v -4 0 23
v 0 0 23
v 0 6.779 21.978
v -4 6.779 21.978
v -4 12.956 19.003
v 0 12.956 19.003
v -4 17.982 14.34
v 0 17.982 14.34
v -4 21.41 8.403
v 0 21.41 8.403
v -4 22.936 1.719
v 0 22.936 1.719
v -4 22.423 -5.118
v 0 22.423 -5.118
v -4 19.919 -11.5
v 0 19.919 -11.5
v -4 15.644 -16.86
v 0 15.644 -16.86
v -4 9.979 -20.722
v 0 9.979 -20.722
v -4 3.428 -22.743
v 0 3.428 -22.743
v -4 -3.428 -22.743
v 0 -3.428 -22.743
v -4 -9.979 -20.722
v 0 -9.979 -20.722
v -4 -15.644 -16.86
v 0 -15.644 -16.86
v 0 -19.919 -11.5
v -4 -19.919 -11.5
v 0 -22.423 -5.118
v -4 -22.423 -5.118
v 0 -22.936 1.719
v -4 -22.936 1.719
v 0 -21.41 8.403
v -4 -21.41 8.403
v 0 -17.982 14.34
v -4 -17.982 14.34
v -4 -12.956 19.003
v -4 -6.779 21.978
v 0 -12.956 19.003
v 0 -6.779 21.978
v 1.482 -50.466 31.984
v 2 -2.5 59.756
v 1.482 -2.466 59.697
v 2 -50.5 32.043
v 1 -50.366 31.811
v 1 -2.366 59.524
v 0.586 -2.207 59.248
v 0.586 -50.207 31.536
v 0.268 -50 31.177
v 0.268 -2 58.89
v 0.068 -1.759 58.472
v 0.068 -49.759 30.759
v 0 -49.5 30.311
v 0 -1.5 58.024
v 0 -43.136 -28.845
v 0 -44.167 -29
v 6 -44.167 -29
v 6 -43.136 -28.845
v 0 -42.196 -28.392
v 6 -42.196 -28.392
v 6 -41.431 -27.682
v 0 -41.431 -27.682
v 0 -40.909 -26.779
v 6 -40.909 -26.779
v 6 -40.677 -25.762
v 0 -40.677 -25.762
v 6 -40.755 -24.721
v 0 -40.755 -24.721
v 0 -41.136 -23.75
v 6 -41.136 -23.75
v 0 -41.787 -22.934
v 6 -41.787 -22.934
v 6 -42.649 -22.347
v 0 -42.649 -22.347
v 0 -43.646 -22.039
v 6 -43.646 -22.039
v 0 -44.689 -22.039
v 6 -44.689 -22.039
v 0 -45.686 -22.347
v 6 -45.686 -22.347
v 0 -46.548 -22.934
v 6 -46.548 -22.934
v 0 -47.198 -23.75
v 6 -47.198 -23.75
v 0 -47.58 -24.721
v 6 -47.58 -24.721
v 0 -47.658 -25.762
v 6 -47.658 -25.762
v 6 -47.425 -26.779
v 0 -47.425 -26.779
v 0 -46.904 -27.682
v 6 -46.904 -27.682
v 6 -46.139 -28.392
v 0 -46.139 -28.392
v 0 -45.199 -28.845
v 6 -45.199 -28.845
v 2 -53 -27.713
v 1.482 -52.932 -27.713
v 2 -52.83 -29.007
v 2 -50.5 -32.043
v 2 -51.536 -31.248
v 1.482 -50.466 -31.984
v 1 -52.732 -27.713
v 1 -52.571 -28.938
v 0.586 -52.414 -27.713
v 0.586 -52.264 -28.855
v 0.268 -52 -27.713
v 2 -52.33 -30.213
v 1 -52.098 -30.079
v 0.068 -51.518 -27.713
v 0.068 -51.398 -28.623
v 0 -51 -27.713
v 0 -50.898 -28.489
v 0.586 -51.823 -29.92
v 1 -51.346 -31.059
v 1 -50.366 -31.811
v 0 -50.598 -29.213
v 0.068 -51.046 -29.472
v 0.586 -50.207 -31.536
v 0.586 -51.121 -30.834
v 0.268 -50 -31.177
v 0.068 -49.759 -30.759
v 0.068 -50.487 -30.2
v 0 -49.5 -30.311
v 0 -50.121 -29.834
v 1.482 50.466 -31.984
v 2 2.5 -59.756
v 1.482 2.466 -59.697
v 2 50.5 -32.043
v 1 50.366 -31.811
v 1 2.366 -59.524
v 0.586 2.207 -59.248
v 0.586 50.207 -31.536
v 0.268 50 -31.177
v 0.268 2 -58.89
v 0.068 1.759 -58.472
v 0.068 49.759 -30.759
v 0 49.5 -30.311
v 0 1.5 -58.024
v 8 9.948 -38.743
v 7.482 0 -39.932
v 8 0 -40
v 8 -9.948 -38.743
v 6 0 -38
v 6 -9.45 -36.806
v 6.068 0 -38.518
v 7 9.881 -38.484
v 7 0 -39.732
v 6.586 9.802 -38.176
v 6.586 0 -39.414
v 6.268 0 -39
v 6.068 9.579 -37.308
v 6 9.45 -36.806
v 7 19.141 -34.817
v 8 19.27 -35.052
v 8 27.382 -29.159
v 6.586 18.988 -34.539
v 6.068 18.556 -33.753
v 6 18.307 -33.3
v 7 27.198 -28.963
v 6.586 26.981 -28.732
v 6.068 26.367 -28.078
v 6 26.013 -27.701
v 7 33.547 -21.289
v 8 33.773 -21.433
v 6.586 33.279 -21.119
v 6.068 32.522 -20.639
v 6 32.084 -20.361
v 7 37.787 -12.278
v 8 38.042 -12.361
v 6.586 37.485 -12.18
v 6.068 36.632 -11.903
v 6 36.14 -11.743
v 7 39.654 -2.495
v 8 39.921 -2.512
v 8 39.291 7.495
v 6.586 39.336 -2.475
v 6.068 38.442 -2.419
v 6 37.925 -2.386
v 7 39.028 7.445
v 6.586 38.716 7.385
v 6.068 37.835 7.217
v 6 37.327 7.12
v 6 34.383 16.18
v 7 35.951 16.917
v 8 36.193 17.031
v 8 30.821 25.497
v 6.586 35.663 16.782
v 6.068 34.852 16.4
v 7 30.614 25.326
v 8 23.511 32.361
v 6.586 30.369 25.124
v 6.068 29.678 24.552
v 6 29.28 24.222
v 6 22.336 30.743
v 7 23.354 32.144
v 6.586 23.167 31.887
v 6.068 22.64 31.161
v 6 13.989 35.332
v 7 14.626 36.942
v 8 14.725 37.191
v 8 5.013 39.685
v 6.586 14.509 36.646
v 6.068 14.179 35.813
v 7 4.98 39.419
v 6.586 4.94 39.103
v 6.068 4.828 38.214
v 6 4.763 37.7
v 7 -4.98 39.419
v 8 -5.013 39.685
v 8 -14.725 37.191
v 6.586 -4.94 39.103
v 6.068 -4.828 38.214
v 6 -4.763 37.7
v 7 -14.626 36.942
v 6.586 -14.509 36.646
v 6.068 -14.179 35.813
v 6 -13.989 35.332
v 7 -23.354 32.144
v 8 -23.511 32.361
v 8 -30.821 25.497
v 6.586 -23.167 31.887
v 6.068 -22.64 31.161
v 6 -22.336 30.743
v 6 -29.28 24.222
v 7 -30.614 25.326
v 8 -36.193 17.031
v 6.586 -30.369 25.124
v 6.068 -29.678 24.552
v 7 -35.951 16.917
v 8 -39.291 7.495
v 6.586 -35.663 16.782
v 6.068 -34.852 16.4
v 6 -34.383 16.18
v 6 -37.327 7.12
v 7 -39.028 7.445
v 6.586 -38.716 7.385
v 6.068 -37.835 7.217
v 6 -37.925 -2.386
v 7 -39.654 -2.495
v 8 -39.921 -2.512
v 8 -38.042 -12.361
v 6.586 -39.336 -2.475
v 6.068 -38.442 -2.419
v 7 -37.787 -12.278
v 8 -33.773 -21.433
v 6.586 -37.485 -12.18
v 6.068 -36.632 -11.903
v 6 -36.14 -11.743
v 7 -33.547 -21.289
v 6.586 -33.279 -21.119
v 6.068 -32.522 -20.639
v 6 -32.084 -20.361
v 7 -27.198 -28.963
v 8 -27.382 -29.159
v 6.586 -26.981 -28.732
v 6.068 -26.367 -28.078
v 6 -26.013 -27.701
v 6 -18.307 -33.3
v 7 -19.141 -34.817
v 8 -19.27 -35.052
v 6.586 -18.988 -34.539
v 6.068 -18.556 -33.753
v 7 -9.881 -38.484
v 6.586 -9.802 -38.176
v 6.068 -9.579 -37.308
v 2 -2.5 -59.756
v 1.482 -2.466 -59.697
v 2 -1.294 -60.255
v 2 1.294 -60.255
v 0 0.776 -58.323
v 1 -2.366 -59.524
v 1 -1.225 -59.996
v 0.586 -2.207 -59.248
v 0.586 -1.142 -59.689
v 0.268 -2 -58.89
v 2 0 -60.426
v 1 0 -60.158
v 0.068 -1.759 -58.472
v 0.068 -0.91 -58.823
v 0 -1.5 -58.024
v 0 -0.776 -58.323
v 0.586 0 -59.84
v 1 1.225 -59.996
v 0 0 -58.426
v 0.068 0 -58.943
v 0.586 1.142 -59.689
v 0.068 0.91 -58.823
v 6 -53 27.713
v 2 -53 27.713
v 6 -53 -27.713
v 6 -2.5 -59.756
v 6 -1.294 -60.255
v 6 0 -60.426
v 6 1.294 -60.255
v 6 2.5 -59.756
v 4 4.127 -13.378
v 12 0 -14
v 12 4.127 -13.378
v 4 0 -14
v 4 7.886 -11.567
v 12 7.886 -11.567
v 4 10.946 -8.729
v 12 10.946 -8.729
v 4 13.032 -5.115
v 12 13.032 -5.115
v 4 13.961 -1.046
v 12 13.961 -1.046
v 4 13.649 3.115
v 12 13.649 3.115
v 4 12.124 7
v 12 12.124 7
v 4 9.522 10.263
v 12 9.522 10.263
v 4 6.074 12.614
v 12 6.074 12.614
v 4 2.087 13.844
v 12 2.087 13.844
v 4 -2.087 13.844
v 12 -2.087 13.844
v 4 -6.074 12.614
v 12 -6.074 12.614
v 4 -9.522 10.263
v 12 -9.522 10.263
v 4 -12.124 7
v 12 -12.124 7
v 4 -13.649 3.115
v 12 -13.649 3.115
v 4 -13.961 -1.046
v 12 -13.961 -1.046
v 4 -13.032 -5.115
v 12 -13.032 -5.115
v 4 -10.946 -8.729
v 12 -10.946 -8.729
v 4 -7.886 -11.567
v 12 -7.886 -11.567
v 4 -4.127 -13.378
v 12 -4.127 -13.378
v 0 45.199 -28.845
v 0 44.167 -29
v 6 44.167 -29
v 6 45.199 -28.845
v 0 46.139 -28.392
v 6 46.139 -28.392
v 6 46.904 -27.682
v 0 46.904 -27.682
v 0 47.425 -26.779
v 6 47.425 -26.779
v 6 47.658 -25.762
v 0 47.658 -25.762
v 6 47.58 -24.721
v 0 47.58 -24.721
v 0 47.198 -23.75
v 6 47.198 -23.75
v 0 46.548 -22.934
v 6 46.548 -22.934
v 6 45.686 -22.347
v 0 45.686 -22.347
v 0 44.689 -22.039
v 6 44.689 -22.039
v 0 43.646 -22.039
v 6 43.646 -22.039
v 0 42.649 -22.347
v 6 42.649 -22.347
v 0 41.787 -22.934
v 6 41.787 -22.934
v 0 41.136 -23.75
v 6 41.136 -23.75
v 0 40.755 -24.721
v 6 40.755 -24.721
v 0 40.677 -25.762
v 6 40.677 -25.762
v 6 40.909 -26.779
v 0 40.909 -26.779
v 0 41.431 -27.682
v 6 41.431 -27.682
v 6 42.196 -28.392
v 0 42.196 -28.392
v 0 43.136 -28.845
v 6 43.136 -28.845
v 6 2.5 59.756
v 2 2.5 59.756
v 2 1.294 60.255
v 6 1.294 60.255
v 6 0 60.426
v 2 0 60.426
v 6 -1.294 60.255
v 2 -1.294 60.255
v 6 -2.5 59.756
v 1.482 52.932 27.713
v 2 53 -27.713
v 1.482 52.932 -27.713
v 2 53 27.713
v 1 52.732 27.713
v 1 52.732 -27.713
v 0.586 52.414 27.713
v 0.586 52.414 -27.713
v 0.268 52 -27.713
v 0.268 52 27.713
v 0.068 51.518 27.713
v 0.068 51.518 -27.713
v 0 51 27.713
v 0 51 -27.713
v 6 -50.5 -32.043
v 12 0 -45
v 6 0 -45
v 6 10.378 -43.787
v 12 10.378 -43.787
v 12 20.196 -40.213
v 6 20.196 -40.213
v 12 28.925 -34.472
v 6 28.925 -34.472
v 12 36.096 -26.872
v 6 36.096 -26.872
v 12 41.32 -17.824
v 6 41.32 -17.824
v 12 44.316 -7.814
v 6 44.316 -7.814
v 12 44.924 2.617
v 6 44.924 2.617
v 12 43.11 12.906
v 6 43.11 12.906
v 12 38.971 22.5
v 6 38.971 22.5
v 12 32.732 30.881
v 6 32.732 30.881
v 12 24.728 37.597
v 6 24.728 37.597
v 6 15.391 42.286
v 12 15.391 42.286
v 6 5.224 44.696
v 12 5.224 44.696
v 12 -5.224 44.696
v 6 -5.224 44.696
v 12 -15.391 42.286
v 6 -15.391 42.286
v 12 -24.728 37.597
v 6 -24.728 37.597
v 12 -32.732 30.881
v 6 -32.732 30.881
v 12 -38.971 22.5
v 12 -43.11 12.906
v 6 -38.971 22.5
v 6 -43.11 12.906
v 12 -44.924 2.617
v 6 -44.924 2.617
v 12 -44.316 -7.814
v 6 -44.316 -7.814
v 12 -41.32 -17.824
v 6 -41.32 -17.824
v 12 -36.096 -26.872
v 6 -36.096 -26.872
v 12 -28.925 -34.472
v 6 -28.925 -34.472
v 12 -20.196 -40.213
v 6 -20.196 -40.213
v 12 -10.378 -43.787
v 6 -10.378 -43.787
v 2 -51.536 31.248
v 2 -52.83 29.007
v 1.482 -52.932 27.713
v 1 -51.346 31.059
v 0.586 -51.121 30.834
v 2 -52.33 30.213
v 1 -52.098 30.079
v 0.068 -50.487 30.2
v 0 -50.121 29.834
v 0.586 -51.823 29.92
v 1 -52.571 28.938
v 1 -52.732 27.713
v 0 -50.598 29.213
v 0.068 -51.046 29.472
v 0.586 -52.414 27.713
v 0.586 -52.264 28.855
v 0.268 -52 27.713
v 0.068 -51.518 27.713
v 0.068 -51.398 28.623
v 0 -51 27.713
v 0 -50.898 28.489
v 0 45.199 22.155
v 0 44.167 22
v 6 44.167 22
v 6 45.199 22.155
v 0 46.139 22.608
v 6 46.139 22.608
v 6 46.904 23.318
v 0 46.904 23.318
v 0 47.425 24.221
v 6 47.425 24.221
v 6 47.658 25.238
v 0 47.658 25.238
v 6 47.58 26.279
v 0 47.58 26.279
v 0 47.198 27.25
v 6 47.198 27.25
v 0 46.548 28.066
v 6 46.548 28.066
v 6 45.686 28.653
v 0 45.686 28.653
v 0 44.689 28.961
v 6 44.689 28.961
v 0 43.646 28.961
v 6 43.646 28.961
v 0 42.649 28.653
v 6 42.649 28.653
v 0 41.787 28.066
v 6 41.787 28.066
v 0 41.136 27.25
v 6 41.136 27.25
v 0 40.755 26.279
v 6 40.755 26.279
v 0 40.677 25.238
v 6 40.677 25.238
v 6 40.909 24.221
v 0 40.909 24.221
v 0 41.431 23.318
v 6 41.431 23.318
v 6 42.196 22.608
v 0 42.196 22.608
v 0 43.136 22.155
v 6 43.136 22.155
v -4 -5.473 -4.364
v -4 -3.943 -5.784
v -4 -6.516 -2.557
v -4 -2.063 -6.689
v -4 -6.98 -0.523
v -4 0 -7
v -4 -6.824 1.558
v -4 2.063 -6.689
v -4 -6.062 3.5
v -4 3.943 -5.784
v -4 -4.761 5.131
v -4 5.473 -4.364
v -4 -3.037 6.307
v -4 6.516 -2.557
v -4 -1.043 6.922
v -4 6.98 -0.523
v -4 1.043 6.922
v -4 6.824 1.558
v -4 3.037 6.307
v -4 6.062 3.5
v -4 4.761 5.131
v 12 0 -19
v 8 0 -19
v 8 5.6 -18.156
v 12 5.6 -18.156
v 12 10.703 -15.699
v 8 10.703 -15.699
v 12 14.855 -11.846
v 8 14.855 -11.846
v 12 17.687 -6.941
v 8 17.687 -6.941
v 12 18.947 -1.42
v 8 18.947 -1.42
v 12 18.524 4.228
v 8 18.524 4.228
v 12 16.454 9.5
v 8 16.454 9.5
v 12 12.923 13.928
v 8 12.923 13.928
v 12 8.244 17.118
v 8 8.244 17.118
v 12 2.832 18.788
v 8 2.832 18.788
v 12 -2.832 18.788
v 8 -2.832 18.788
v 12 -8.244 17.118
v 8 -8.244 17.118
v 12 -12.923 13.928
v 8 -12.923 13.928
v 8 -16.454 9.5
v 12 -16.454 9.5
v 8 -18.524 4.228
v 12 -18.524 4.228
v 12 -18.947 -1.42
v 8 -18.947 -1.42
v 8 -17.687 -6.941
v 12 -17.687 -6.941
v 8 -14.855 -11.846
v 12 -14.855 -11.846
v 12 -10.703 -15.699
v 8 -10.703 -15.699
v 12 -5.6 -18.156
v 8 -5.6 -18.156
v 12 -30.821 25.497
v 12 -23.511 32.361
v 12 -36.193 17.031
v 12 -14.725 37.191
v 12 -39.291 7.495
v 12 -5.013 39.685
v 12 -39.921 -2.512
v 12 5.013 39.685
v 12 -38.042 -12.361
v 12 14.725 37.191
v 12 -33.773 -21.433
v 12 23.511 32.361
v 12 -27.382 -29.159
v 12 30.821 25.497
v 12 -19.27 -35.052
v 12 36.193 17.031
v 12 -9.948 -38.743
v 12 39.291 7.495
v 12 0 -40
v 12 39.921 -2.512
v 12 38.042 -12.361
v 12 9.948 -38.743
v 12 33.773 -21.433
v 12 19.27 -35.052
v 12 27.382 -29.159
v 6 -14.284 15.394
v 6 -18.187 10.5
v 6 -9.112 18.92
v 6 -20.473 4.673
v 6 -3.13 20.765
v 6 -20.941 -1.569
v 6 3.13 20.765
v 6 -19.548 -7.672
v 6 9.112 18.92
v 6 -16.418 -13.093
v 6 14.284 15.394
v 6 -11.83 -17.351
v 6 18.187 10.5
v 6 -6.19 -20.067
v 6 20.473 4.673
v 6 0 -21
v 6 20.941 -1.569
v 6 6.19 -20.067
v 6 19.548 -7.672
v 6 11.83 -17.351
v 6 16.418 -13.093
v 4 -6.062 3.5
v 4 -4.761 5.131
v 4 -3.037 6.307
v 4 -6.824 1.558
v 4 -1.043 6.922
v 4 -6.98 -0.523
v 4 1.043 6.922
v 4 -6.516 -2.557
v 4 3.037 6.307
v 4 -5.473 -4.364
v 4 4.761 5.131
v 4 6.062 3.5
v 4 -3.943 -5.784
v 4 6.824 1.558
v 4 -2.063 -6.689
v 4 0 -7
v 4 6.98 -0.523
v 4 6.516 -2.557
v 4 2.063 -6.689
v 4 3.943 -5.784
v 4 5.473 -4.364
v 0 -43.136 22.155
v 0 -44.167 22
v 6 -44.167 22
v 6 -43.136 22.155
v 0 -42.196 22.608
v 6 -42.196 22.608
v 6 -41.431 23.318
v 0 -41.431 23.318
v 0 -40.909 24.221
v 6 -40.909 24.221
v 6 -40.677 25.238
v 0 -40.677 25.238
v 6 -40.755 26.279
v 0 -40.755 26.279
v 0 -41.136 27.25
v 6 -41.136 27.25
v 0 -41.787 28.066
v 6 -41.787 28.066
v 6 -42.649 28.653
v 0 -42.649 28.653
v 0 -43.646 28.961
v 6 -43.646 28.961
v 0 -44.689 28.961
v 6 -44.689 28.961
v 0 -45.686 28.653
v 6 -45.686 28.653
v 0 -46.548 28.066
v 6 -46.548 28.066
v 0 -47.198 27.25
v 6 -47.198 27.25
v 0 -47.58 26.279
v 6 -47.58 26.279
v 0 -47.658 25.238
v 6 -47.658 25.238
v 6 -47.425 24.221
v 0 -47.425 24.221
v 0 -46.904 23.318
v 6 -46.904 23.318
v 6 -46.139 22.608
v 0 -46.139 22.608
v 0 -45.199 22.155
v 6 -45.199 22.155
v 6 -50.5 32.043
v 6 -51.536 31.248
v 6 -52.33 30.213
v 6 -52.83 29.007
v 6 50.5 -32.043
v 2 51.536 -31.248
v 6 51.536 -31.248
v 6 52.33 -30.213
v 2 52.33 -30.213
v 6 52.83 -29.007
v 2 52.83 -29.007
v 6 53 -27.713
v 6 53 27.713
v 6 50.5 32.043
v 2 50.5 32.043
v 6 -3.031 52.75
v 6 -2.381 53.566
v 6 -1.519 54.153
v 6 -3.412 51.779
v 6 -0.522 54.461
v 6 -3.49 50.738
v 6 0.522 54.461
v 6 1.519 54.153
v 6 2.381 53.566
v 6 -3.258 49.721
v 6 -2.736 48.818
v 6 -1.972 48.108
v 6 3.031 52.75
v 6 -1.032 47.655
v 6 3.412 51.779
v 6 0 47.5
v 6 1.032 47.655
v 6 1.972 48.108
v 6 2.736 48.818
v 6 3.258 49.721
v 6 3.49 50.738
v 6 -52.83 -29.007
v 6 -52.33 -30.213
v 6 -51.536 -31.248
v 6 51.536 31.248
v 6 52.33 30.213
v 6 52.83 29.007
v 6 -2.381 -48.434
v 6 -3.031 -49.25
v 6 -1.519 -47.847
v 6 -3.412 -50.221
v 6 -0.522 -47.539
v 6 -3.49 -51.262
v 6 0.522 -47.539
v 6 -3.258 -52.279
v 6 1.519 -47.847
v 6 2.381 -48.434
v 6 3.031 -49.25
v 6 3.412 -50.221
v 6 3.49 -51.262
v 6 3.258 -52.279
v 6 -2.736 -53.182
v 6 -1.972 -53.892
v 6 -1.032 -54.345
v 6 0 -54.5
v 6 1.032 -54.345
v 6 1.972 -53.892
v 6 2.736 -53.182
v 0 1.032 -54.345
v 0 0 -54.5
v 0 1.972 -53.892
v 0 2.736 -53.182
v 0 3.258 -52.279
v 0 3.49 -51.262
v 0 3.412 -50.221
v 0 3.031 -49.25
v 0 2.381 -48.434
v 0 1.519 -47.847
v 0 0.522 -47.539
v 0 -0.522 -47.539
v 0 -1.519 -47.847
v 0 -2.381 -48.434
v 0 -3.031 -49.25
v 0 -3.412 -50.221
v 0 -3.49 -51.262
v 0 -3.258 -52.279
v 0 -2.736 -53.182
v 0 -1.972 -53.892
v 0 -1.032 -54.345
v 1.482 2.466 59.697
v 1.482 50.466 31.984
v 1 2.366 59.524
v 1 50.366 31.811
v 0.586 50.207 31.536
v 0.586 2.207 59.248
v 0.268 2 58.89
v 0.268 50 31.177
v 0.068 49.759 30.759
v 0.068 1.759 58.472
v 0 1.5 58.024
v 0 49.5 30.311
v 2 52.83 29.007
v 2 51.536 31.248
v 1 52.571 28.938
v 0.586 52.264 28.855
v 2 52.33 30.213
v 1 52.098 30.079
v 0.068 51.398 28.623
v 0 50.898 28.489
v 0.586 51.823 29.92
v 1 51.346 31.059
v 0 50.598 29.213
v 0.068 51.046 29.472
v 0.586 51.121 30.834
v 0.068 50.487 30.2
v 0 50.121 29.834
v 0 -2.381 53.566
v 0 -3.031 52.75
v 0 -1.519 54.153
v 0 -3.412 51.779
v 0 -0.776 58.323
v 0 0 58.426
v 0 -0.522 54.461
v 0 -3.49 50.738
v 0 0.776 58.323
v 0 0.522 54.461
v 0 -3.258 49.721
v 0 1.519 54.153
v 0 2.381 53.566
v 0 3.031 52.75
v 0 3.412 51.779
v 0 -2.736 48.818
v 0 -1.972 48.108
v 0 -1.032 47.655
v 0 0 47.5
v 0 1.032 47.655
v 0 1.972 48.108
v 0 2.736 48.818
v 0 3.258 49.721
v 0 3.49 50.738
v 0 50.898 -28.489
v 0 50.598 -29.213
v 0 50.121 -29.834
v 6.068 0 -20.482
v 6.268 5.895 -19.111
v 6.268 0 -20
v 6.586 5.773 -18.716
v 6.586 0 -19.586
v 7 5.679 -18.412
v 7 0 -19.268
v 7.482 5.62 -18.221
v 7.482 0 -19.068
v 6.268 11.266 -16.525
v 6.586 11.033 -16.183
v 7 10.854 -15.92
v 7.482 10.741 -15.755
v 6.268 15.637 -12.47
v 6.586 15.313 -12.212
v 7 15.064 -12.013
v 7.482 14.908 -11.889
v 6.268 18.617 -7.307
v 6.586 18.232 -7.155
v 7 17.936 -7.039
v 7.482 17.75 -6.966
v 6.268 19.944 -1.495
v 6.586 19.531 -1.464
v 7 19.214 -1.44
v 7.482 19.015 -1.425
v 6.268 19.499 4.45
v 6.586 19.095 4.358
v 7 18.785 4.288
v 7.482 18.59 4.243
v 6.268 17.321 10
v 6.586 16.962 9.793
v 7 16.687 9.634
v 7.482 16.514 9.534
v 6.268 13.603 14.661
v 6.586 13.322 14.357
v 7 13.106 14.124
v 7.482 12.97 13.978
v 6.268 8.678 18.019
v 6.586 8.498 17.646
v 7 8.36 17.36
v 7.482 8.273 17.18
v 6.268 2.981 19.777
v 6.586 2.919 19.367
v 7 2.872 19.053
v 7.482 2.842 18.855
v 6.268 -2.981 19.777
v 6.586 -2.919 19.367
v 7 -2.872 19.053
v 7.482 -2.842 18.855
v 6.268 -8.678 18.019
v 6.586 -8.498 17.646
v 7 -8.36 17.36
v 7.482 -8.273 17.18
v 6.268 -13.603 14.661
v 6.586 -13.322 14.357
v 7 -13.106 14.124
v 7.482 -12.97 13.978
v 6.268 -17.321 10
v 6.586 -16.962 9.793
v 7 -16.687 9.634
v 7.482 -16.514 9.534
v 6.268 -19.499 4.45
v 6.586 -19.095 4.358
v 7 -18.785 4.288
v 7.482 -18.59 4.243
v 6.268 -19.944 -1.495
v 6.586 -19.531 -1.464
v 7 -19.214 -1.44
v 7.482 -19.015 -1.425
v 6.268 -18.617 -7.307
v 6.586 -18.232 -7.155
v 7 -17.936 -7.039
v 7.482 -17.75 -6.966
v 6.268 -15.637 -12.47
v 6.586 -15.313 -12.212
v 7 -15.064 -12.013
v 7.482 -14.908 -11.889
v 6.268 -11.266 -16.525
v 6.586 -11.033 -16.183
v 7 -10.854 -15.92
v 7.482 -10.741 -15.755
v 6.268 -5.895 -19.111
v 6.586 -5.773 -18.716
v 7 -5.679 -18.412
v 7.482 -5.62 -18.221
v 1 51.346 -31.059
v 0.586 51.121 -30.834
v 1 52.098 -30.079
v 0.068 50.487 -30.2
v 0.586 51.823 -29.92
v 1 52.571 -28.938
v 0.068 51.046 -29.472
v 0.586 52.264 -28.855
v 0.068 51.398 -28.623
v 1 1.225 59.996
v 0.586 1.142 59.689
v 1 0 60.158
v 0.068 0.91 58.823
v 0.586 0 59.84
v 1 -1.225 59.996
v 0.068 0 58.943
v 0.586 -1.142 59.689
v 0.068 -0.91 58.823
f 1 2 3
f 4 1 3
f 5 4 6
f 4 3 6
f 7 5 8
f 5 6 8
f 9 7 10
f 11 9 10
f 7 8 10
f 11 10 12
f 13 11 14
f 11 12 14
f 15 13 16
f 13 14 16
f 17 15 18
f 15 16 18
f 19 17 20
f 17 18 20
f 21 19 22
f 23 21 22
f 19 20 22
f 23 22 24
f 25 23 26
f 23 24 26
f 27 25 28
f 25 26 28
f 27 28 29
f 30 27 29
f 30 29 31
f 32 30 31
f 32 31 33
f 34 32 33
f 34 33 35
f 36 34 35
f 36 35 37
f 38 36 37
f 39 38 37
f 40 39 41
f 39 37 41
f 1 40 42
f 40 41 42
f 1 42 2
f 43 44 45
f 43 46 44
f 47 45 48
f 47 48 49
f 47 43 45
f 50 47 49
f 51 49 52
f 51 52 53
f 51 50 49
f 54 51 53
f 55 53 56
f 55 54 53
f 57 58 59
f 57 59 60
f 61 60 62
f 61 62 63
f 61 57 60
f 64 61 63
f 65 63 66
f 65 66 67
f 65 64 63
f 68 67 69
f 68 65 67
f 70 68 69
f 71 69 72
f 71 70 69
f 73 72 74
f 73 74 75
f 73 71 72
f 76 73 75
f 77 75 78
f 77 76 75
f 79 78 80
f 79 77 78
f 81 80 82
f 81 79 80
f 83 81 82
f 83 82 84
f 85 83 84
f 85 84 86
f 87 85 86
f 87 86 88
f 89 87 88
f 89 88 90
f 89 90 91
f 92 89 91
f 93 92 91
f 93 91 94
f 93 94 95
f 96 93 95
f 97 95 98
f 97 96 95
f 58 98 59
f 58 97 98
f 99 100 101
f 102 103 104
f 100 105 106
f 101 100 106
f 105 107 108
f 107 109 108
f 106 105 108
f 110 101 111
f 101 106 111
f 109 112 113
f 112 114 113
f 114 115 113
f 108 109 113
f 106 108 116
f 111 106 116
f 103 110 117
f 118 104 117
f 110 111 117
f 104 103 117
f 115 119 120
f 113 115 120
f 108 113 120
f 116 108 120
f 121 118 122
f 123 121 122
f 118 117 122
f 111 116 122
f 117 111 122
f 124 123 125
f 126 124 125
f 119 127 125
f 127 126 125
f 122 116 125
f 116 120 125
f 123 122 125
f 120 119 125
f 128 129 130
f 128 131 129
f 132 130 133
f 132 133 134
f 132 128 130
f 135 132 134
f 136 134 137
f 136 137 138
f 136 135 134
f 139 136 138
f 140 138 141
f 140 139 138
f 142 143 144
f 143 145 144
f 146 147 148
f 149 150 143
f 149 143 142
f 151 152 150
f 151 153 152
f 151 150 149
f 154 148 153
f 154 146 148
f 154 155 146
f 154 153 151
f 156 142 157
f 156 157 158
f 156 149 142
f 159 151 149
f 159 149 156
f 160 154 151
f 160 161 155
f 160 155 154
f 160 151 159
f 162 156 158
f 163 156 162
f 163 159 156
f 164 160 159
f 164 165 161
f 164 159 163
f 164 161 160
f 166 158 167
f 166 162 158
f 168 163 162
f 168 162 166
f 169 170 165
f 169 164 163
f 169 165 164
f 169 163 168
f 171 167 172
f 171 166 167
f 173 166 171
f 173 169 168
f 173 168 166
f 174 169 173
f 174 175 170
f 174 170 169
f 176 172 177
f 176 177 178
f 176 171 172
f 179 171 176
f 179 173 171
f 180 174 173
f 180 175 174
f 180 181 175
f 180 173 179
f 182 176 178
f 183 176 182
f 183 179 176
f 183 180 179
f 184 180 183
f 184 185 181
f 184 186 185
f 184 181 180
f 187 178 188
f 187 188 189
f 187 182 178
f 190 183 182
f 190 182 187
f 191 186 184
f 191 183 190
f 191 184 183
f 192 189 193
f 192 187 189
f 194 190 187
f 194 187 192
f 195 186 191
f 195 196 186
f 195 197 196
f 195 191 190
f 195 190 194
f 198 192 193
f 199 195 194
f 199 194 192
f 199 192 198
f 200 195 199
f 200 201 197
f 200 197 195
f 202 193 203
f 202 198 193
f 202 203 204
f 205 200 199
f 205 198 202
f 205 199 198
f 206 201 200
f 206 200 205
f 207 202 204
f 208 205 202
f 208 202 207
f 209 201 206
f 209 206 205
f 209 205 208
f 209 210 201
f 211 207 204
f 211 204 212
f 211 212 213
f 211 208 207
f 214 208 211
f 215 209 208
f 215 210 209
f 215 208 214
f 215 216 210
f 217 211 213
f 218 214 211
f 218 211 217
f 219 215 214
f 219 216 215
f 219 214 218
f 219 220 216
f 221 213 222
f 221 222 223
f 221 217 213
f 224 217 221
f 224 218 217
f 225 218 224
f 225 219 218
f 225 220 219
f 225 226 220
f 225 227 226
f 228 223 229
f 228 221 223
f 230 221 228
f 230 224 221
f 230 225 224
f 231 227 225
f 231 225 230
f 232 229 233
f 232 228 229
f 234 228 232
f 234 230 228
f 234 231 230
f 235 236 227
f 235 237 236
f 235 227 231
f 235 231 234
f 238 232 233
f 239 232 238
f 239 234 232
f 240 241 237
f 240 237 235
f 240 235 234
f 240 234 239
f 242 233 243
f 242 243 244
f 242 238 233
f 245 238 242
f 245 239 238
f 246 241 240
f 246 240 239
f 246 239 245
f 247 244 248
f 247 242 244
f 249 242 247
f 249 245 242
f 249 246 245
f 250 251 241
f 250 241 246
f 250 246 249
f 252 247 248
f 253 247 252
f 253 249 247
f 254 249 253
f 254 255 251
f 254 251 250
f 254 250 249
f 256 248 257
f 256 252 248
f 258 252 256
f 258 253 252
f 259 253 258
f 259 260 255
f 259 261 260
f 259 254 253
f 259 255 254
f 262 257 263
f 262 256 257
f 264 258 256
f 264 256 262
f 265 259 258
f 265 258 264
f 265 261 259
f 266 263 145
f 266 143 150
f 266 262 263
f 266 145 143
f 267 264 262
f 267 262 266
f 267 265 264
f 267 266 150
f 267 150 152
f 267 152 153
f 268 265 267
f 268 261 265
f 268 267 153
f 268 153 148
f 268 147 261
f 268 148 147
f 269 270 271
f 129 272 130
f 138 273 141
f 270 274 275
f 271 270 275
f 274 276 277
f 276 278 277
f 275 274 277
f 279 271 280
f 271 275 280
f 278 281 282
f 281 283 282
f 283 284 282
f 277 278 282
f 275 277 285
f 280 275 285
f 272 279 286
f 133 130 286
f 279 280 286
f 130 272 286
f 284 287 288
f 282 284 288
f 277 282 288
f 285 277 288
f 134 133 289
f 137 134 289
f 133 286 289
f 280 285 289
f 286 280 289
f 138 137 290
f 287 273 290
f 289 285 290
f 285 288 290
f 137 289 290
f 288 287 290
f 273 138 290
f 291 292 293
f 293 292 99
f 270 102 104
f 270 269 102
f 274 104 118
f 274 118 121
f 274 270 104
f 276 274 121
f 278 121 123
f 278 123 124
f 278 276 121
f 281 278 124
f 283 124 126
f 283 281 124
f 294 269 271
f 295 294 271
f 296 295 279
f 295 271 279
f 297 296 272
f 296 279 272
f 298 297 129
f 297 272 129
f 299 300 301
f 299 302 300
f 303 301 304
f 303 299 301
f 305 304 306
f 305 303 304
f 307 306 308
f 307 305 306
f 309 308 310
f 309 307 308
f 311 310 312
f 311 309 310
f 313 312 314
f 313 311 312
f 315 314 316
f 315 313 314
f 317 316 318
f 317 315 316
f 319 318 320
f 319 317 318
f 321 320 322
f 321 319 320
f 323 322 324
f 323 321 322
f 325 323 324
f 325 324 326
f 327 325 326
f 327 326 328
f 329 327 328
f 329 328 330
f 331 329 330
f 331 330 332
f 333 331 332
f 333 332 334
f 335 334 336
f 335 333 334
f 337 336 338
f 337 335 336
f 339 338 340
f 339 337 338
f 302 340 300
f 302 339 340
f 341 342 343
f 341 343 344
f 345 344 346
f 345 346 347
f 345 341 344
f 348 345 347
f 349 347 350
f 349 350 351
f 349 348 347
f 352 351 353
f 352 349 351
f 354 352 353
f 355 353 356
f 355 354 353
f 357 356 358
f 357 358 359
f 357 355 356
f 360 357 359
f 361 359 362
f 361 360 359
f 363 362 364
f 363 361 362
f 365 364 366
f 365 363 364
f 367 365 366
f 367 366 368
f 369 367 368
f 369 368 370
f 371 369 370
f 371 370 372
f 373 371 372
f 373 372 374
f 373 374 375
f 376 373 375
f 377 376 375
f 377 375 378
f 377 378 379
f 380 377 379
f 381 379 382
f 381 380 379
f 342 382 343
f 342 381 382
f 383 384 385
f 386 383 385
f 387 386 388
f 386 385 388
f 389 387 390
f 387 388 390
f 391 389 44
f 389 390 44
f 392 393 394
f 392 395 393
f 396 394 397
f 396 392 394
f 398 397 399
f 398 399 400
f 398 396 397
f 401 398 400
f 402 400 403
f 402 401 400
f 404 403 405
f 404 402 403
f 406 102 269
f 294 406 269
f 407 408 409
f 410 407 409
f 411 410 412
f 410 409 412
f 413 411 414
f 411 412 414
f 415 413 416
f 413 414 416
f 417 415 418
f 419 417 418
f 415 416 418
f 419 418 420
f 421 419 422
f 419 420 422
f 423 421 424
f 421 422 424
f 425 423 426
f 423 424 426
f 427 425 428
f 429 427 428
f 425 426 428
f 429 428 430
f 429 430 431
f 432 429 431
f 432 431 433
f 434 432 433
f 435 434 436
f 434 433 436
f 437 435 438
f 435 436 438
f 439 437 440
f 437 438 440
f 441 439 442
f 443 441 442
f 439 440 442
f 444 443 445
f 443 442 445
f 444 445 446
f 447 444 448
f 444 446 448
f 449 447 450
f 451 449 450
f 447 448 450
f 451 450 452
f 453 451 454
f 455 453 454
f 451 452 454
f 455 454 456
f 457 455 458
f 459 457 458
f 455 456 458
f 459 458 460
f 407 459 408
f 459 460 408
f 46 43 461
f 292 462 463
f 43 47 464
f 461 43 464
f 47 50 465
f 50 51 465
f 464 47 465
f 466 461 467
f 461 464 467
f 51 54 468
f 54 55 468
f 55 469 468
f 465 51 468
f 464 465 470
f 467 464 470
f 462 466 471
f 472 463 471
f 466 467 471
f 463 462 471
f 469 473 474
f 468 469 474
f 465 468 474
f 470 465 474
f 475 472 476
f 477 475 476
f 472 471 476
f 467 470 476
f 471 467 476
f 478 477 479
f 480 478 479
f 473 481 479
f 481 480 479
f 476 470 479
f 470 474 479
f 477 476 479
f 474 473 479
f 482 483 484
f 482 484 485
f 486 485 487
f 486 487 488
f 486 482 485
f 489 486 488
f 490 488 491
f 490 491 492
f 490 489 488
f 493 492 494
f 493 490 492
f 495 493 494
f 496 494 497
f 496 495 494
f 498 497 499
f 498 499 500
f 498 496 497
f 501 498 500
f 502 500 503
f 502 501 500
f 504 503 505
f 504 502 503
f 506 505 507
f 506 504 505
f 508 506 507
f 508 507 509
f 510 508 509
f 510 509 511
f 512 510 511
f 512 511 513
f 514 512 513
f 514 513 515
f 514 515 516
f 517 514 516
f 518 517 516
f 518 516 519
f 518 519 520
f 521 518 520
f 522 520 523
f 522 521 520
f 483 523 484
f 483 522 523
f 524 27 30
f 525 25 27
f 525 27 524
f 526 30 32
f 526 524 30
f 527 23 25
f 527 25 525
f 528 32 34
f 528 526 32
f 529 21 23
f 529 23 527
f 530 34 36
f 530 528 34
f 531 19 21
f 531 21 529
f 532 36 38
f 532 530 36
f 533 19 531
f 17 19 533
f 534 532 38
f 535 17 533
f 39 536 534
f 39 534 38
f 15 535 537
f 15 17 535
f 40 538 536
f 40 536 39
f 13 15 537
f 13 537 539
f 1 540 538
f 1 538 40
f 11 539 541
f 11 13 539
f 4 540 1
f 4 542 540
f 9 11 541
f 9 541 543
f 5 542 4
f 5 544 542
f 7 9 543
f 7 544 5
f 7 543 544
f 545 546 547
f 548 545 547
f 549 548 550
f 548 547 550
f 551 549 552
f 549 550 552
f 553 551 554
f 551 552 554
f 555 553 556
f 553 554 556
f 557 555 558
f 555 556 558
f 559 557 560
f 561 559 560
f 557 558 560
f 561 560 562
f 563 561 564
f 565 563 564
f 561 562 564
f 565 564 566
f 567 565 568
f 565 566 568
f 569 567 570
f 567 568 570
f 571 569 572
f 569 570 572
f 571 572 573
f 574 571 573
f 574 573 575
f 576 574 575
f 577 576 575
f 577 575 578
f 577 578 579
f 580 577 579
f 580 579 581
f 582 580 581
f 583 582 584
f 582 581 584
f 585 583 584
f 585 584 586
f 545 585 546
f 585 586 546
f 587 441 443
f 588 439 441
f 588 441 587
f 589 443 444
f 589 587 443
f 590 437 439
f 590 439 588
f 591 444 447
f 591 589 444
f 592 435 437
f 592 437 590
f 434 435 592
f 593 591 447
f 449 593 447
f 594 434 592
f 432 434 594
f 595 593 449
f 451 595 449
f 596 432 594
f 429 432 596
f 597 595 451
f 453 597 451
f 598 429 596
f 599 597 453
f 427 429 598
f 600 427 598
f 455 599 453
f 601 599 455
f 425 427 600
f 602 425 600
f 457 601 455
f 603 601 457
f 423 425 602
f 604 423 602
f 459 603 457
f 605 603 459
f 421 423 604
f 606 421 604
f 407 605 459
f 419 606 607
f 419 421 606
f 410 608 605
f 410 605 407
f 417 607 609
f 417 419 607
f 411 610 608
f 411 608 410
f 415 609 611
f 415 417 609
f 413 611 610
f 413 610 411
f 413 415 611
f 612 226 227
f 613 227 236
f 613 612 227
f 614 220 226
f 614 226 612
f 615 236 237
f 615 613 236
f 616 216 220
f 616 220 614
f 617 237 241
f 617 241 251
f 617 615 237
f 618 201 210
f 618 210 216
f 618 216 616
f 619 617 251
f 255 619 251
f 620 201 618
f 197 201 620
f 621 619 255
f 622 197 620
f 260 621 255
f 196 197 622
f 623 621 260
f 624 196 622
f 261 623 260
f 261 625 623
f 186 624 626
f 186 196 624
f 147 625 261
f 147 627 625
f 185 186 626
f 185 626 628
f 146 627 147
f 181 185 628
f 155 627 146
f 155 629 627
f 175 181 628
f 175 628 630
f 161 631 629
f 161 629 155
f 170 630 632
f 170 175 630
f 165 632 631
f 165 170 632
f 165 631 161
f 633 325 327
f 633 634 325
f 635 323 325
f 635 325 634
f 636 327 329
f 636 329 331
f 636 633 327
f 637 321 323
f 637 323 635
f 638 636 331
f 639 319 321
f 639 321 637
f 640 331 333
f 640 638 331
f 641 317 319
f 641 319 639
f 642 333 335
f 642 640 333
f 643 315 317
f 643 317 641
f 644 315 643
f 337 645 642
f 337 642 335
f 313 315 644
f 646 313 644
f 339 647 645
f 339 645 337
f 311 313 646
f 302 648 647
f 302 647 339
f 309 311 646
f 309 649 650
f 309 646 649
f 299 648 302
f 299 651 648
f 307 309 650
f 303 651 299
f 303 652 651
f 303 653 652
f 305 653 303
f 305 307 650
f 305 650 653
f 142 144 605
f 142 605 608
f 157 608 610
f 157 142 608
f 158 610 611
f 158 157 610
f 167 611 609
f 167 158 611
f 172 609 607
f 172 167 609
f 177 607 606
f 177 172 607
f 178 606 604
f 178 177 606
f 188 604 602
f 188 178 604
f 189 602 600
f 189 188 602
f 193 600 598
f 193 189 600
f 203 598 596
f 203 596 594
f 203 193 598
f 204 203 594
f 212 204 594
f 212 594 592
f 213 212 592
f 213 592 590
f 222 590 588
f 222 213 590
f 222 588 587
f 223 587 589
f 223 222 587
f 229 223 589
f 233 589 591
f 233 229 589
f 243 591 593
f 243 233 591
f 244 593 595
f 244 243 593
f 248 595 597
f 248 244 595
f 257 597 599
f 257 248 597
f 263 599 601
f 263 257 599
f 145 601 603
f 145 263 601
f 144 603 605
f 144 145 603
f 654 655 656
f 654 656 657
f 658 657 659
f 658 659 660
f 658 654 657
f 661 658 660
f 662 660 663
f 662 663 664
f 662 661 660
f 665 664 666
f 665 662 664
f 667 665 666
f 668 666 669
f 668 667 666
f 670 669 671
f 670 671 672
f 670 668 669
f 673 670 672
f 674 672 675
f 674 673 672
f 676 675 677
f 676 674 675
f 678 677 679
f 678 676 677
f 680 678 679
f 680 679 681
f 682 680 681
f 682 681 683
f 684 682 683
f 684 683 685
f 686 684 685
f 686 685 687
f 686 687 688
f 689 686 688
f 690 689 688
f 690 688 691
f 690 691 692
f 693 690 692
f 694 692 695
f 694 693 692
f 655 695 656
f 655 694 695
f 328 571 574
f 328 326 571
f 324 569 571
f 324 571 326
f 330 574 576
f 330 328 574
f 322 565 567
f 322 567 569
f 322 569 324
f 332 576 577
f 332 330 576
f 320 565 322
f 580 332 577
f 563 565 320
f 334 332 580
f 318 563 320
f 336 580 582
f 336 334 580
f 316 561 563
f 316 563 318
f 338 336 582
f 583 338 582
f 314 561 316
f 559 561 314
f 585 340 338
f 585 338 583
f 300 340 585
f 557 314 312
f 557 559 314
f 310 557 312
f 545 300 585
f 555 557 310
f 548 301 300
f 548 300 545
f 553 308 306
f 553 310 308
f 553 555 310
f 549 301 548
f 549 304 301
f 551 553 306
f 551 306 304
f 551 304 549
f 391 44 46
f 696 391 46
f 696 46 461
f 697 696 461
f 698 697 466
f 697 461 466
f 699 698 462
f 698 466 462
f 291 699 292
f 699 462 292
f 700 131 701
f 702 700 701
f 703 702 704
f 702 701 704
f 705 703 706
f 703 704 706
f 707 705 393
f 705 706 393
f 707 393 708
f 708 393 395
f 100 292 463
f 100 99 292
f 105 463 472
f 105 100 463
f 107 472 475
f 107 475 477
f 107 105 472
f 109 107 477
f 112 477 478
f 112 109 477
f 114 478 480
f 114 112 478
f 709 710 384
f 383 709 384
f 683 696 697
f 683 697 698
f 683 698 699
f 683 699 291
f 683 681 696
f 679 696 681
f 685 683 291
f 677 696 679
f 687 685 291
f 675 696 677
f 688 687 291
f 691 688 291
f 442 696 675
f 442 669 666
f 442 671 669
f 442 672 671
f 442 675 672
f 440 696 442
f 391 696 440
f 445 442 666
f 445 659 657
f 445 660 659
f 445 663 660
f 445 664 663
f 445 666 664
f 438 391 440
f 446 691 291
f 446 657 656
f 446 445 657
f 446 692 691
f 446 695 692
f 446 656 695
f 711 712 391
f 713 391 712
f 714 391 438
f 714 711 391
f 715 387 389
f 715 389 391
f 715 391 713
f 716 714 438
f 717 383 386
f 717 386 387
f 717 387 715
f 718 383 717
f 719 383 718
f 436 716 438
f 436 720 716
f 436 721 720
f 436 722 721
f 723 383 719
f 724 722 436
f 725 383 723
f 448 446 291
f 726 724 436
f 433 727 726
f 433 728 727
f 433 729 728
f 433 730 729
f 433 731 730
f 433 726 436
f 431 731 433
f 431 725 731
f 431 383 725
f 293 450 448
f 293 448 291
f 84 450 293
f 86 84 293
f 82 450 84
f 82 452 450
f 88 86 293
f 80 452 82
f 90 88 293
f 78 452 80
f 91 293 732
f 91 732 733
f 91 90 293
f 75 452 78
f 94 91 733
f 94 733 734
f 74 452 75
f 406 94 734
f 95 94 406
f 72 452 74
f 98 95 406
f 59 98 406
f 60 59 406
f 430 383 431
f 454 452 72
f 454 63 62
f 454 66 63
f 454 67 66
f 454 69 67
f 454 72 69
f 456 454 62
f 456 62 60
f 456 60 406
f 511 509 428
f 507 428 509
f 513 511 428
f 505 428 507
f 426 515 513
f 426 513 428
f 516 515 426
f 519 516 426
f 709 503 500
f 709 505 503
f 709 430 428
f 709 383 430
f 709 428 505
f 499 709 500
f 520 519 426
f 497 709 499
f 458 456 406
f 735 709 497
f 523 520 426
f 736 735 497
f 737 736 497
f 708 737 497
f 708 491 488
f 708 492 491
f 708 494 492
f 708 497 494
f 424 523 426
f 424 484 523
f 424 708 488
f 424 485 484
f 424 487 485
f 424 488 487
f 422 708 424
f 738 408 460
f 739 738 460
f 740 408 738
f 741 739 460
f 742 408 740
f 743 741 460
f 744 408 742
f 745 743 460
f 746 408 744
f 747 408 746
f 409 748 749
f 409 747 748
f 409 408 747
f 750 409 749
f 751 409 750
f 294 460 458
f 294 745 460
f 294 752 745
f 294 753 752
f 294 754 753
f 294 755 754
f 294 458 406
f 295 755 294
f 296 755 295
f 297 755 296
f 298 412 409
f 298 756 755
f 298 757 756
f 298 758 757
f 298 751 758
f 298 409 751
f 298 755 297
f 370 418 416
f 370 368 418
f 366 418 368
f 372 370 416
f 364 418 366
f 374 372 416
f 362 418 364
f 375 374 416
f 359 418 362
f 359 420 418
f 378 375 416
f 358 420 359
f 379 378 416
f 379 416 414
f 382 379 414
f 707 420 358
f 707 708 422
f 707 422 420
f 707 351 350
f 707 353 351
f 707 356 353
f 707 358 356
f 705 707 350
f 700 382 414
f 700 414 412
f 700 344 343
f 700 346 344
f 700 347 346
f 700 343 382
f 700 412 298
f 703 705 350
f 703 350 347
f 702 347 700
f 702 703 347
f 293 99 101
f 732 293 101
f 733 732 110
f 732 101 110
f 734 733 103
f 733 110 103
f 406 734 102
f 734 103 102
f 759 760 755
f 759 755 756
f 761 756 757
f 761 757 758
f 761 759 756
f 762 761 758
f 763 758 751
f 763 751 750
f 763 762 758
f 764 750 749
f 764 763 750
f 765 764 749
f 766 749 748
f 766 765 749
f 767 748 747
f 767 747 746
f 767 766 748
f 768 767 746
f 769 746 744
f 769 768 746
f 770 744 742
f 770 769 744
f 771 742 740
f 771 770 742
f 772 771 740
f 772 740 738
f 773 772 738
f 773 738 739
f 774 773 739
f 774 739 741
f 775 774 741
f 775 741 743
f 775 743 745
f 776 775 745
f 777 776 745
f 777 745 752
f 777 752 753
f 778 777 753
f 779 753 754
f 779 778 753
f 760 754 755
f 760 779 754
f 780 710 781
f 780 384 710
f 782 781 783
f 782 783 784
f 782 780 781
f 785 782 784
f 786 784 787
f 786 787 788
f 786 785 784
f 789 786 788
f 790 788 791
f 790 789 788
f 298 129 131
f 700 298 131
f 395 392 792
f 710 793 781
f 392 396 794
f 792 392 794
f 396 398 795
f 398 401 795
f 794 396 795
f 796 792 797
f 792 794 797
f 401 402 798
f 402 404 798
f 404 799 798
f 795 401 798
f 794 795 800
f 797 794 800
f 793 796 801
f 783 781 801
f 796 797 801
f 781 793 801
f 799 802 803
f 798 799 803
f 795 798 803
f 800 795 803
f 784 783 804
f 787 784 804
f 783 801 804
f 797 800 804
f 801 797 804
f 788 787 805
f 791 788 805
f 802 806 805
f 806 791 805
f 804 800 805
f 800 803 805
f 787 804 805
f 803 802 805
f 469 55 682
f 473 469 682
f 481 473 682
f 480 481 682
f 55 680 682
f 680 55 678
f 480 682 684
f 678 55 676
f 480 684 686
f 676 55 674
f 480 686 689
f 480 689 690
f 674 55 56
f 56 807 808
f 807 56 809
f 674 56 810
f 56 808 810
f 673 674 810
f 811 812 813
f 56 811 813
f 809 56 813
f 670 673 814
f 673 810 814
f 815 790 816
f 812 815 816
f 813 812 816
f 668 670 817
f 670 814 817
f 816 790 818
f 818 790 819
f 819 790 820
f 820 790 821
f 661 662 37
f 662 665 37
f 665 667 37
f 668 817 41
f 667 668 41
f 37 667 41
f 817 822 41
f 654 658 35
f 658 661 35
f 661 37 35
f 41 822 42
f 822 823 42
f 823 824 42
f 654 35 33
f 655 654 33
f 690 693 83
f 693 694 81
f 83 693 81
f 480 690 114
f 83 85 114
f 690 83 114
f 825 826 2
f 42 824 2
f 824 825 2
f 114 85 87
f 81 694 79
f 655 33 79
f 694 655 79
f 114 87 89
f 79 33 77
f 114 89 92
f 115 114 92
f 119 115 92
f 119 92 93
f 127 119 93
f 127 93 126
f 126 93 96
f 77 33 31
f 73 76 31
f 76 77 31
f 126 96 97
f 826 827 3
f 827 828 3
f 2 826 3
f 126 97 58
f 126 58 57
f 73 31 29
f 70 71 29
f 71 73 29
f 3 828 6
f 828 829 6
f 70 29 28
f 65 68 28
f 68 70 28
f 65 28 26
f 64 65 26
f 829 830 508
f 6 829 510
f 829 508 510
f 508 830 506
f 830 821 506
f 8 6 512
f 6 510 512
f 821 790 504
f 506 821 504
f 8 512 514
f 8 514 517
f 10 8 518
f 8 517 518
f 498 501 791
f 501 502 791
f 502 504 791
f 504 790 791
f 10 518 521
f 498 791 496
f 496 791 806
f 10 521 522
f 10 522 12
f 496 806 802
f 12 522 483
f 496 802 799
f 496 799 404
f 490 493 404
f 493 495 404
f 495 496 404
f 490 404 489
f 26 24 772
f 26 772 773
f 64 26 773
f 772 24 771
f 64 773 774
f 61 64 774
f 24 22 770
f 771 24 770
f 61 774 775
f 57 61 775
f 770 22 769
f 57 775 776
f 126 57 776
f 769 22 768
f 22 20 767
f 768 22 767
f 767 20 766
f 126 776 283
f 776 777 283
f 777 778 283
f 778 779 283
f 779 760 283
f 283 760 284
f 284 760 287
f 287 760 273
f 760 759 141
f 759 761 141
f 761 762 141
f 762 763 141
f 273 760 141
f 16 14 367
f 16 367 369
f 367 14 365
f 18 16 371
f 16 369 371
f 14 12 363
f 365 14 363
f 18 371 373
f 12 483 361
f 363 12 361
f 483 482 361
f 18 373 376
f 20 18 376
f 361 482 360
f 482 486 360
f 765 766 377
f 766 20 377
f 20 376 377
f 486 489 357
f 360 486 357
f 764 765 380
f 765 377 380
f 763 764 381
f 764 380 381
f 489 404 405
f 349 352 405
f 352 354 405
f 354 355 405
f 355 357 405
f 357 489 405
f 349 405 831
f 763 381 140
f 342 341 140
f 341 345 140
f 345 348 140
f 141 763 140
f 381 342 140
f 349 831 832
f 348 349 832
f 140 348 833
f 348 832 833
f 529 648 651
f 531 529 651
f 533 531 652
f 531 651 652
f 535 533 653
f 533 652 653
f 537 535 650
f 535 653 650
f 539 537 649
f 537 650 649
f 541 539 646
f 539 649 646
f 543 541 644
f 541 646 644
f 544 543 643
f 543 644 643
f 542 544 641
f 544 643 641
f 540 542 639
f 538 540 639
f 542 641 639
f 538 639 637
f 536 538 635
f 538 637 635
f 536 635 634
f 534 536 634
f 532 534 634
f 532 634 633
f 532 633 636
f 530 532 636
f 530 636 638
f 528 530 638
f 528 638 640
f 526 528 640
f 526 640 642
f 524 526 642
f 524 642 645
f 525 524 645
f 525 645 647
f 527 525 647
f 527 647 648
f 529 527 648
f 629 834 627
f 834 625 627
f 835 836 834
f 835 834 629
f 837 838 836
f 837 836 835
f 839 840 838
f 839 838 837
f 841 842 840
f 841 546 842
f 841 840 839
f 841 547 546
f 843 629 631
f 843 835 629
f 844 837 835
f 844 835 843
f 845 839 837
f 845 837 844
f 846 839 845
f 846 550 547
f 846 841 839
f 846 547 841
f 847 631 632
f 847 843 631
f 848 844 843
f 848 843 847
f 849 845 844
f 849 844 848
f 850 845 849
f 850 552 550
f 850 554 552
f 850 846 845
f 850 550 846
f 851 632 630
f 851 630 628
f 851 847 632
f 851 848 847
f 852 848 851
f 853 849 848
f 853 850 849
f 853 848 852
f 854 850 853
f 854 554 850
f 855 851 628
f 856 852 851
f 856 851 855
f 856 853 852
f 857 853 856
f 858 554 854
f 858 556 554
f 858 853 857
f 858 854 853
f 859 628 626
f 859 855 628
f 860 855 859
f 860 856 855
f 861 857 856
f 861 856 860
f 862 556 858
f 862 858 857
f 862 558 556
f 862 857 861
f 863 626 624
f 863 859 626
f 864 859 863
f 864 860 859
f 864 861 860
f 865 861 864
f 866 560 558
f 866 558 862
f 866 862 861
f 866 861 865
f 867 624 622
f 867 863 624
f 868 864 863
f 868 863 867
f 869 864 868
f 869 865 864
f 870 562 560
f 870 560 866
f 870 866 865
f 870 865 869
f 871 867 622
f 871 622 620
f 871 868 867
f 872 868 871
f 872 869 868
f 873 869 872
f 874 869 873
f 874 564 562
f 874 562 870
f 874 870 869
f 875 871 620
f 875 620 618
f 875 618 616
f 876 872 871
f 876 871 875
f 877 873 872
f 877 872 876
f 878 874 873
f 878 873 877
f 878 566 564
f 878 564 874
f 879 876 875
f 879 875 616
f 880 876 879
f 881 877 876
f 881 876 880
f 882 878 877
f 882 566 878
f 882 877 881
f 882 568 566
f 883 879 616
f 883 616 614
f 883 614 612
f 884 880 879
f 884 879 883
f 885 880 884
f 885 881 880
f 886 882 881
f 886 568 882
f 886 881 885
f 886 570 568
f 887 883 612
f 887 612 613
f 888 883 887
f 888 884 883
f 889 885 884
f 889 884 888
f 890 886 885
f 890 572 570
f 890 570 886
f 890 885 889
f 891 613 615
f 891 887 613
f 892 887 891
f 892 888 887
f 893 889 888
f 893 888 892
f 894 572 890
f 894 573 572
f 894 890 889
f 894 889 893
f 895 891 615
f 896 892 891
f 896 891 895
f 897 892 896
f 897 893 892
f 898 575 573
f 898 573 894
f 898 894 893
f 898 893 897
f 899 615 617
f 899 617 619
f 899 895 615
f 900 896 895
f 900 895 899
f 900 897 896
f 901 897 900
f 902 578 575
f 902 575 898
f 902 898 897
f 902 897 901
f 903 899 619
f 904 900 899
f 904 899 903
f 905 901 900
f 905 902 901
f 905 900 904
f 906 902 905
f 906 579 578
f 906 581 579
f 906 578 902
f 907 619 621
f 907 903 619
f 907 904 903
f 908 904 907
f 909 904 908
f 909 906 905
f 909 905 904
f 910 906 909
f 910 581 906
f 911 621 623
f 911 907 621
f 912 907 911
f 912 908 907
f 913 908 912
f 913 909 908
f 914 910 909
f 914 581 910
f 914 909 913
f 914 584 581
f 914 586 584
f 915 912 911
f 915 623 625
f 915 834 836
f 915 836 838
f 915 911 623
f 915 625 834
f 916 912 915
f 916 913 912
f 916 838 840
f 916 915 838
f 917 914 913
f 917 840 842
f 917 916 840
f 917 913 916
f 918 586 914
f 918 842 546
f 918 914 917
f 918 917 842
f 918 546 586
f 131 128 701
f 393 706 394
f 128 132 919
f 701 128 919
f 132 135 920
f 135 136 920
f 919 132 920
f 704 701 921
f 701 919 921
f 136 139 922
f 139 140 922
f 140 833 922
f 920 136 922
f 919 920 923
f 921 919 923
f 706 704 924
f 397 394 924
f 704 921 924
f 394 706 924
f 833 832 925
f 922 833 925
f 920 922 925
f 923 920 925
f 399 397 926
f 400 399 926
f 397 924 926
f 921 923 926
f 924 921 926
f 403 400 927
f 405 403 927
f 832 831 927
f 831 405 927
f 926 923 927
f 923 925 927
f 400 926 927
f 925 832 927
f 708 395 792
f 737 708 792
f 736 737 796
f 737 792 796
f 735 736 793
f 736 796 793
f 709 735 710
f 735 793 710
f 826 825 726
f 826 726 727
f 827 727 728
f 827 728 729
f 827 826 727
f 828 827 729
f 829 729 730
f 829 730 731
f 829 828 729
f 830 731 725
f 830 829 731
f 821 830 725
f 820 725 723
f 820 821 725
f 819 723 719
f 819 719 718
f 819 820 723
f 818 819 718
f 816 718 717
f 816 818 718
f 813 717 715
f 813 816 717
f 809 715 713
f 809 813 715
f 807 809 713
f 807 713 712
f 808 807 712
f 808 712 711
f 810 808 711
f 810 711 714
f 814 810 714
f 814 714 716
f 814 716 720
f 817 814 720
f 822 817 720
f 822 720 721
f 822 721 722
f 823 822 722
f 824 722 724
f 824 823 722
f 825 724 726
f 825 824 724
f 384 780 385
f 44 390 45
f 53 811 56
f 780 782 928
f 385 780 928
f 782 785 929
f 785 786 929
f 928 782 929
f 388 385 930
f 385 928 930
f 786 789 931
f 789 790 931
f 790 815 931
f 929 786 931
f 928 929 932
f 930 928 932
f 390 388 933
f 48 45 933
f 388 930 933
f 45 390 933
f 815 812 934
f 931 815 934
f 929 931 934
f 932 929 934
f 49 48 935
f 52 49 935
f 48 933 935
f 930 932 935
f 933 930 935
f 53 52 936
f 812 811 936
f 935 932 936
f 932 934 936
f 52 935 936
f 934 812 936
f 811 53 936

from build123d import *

# Parameters (mm, degrees)
SKETCH1_R               = 3.5
BOSS_EXTRUDE1_DEPTH     = 6
FILLET1_R               = 2
SKETCH2_R               = 45
SKETCH2_R_2             = 40
BOSS_EXTRUDE2_DEPTH     = 6
FILLET2_R               = 2
SKETCH3_R               = 19
SKETCH3_R_2             = 14
BOSS_EXTRUDE3_DEPTH     = 6
FILLET3_R               = 2
SKETCH4_R               = 14
CUT_EXTRUDE1_DEPTH      = 2
SKETCH6_R               = 23
BOSS_EXTRUDE4_DEPTH     = 4
SKETCH7_R               = 7
CUT_EXTRUDE2_DEPTH      = 9
CUT_EXTRUDE2_DEPTH_BACK = 9


with BuildPart() as part:
    # Sketch1 → Boss-Extrude1 (new body)
    with BuildSketch(Plane(origin=(0, 0, 0), x_dir=(0, 0, -1), z_dir=(1, 0, 0))):
        with BuildLine():
            Line((59.755752861, 2.5), (32.04293994, 50.5))
            ThreePointArc((32.04293994, 50.5), (30.212812921, 52.330127019), (27.712812921, 53))
            Line((27.712812921, 53), (-27.712812921, 53))
            ThreePointArc((-27.712812921, 53), (-30.212812921, 52.330127019), (-32.04293994, 50.5))
            Line((-32.04293994, 50.5), (-59.755752861, 2.5))
            ThreePointArc((-59.755752861, 2.5), (-60.425625842, 0), (-59.755752861, -2.5))
            Line((-59.755752861, -2.5), (-32.04293994, -50.5))
            ThreePointArc((-32.04293994, -50.5), (-30.212812921, -52.330127019), (-27.712812921, -53))
            Line((-27.712812921, -53), (27.712812921, -53))
            ThreePointArc((27.712812921, -53), (30.212812921, -52.330127019), (32.04293994, -50.5))
            Line((32.04293994, -50.5), (59.755752861, -2.5))
            ThreePointArc((59.755752861, -2.5), (60.425625842, 0), (59.755752861, 2.5))
        make_face()
        with Locations((-51, 0)):
            Circle(SKETCH1_R, mode=Mode.SUBTRACT)
        with Locations((-25.5, 44.167295593)):
            Circle(SKETCH1_R, mode=Mode.SUBTRACT)
        with Locations((25.5, 44.167295593)):
            Circle(SKETCH1_R, mode=Mode.SUBTRACT)
        with Locations((51, 0)):
            Circle(SKETCH1_R, mode=Mode.SUBTRACT)
        with Locations((25.5, -44.167295593)):
            Circle(SKETCH1_R, mode=Mode.SUBTRACT)
        with Locations((-25.5, -44.167295593)):
            Circle(SKETCH1_R, mode=Mode.SUBTRACT)
    extrude(amount=BOSS_EXTRUDE1_DEPTH)

    # Fillet1
    fillet1_edges = [part.edges().sort_by_distance(p)[0] for p in [
        (0, 26.5, -45.899346401),
        (0, 0, -60.425625842),
        (0, -26.5, -45.899346401),
        (0, -52.330127019, -30.212812921),
        (0, -53, 0),
        (0, -52.330127019, 30.212812921),
        (0, -26.5, 45.899346401),
        (0, 0, 60.425625842),
        (0, 26.5, 45.899346401),
        (0, 52.330127019, 30.212812921),
        (0, 53, 0),
        (0, 52.330127019, -30.212812921),
    ]]
    fillet(fillet1_edges, radius=FILLET1_R)

    # Sketch2 → Boss-Extrude2 (add)
    with BuildSketch(Plane(origin=(6, 0, 0), x_dir=(0, 0, -1), z_dir=(1, 0, 0))):
        Circle(SKETCH2_R)
        Circle(SKETCH2_R_2, mode=Mode.SUBTRACT)
    extrude(amount=BOSS_EXTRUDE2_DEPTH)

    # Fillet2
    fillet2_edges = [part.edges().sort_by_distance(p)[0] for p in [
        (6, 0, 40),
    ]]
    fillet(fillet2_edges, radius=FILLET2_R)

    # Sketch3 → Boss-Extrude3 (add)
    with BuildSketch(Plane(origin=(6, 0, 0), x_dir=(0, 0, -1), z_dir=(1, 0, 0))):
        Circle(SKETCH3_R)
        Circle(SKETCH3_R_2, mode=Mode.SUBTRACT)
    extrude(amount=BOSS_EXTRUDE3_DEPTH)

    # Fillet3
    fillet3_edges = [part.edges().sort_by_distance(p)[0] for p in [
        (6, 0, 19),
    ]]
    fillet(fillet3_edges, radius=FILLET3_R)

    # Sketch4 → Cut-Extrude1 (cut)
    with BuildSketch(Plane(origin=(6, 0, 0), x_dir=(0, 0, -1), z_dir=(1, 0, 0))):
        Circle(SKETCH4_R)
    extrude(amount=-CUT_EXTRUDE1_DEPTH, mode=Mode.SUBTRACT)

    # Sketch6 → Boss-Extrude4 (add)
    with BuildSketch(Plane.ZY):
        Circle(SKETCH6_R)
    extrude(amount=BOSS_EXTRUDE4_DEPTH)

    # Sketch7 → Cut-Extrude2 (cut, two sides)
    with BuildSketch(Plane(origin=(4, 0, 0), x_dir=(0, 0, -1), z_dir=(1, 0, 0))) as cut_extrude2_sk:
        Circle(SKETCH7_R)
    extrude(amount=CUT_EXTRUDE2_DEPTH, mode=Mode.SUBTRACT)
    extrude(cut_extrude2_sk.sketch, amount=-CUT_EXTRUDE2_DEPTH_BACK, mode=Mode.SUBTRACT)


solid = part.part
